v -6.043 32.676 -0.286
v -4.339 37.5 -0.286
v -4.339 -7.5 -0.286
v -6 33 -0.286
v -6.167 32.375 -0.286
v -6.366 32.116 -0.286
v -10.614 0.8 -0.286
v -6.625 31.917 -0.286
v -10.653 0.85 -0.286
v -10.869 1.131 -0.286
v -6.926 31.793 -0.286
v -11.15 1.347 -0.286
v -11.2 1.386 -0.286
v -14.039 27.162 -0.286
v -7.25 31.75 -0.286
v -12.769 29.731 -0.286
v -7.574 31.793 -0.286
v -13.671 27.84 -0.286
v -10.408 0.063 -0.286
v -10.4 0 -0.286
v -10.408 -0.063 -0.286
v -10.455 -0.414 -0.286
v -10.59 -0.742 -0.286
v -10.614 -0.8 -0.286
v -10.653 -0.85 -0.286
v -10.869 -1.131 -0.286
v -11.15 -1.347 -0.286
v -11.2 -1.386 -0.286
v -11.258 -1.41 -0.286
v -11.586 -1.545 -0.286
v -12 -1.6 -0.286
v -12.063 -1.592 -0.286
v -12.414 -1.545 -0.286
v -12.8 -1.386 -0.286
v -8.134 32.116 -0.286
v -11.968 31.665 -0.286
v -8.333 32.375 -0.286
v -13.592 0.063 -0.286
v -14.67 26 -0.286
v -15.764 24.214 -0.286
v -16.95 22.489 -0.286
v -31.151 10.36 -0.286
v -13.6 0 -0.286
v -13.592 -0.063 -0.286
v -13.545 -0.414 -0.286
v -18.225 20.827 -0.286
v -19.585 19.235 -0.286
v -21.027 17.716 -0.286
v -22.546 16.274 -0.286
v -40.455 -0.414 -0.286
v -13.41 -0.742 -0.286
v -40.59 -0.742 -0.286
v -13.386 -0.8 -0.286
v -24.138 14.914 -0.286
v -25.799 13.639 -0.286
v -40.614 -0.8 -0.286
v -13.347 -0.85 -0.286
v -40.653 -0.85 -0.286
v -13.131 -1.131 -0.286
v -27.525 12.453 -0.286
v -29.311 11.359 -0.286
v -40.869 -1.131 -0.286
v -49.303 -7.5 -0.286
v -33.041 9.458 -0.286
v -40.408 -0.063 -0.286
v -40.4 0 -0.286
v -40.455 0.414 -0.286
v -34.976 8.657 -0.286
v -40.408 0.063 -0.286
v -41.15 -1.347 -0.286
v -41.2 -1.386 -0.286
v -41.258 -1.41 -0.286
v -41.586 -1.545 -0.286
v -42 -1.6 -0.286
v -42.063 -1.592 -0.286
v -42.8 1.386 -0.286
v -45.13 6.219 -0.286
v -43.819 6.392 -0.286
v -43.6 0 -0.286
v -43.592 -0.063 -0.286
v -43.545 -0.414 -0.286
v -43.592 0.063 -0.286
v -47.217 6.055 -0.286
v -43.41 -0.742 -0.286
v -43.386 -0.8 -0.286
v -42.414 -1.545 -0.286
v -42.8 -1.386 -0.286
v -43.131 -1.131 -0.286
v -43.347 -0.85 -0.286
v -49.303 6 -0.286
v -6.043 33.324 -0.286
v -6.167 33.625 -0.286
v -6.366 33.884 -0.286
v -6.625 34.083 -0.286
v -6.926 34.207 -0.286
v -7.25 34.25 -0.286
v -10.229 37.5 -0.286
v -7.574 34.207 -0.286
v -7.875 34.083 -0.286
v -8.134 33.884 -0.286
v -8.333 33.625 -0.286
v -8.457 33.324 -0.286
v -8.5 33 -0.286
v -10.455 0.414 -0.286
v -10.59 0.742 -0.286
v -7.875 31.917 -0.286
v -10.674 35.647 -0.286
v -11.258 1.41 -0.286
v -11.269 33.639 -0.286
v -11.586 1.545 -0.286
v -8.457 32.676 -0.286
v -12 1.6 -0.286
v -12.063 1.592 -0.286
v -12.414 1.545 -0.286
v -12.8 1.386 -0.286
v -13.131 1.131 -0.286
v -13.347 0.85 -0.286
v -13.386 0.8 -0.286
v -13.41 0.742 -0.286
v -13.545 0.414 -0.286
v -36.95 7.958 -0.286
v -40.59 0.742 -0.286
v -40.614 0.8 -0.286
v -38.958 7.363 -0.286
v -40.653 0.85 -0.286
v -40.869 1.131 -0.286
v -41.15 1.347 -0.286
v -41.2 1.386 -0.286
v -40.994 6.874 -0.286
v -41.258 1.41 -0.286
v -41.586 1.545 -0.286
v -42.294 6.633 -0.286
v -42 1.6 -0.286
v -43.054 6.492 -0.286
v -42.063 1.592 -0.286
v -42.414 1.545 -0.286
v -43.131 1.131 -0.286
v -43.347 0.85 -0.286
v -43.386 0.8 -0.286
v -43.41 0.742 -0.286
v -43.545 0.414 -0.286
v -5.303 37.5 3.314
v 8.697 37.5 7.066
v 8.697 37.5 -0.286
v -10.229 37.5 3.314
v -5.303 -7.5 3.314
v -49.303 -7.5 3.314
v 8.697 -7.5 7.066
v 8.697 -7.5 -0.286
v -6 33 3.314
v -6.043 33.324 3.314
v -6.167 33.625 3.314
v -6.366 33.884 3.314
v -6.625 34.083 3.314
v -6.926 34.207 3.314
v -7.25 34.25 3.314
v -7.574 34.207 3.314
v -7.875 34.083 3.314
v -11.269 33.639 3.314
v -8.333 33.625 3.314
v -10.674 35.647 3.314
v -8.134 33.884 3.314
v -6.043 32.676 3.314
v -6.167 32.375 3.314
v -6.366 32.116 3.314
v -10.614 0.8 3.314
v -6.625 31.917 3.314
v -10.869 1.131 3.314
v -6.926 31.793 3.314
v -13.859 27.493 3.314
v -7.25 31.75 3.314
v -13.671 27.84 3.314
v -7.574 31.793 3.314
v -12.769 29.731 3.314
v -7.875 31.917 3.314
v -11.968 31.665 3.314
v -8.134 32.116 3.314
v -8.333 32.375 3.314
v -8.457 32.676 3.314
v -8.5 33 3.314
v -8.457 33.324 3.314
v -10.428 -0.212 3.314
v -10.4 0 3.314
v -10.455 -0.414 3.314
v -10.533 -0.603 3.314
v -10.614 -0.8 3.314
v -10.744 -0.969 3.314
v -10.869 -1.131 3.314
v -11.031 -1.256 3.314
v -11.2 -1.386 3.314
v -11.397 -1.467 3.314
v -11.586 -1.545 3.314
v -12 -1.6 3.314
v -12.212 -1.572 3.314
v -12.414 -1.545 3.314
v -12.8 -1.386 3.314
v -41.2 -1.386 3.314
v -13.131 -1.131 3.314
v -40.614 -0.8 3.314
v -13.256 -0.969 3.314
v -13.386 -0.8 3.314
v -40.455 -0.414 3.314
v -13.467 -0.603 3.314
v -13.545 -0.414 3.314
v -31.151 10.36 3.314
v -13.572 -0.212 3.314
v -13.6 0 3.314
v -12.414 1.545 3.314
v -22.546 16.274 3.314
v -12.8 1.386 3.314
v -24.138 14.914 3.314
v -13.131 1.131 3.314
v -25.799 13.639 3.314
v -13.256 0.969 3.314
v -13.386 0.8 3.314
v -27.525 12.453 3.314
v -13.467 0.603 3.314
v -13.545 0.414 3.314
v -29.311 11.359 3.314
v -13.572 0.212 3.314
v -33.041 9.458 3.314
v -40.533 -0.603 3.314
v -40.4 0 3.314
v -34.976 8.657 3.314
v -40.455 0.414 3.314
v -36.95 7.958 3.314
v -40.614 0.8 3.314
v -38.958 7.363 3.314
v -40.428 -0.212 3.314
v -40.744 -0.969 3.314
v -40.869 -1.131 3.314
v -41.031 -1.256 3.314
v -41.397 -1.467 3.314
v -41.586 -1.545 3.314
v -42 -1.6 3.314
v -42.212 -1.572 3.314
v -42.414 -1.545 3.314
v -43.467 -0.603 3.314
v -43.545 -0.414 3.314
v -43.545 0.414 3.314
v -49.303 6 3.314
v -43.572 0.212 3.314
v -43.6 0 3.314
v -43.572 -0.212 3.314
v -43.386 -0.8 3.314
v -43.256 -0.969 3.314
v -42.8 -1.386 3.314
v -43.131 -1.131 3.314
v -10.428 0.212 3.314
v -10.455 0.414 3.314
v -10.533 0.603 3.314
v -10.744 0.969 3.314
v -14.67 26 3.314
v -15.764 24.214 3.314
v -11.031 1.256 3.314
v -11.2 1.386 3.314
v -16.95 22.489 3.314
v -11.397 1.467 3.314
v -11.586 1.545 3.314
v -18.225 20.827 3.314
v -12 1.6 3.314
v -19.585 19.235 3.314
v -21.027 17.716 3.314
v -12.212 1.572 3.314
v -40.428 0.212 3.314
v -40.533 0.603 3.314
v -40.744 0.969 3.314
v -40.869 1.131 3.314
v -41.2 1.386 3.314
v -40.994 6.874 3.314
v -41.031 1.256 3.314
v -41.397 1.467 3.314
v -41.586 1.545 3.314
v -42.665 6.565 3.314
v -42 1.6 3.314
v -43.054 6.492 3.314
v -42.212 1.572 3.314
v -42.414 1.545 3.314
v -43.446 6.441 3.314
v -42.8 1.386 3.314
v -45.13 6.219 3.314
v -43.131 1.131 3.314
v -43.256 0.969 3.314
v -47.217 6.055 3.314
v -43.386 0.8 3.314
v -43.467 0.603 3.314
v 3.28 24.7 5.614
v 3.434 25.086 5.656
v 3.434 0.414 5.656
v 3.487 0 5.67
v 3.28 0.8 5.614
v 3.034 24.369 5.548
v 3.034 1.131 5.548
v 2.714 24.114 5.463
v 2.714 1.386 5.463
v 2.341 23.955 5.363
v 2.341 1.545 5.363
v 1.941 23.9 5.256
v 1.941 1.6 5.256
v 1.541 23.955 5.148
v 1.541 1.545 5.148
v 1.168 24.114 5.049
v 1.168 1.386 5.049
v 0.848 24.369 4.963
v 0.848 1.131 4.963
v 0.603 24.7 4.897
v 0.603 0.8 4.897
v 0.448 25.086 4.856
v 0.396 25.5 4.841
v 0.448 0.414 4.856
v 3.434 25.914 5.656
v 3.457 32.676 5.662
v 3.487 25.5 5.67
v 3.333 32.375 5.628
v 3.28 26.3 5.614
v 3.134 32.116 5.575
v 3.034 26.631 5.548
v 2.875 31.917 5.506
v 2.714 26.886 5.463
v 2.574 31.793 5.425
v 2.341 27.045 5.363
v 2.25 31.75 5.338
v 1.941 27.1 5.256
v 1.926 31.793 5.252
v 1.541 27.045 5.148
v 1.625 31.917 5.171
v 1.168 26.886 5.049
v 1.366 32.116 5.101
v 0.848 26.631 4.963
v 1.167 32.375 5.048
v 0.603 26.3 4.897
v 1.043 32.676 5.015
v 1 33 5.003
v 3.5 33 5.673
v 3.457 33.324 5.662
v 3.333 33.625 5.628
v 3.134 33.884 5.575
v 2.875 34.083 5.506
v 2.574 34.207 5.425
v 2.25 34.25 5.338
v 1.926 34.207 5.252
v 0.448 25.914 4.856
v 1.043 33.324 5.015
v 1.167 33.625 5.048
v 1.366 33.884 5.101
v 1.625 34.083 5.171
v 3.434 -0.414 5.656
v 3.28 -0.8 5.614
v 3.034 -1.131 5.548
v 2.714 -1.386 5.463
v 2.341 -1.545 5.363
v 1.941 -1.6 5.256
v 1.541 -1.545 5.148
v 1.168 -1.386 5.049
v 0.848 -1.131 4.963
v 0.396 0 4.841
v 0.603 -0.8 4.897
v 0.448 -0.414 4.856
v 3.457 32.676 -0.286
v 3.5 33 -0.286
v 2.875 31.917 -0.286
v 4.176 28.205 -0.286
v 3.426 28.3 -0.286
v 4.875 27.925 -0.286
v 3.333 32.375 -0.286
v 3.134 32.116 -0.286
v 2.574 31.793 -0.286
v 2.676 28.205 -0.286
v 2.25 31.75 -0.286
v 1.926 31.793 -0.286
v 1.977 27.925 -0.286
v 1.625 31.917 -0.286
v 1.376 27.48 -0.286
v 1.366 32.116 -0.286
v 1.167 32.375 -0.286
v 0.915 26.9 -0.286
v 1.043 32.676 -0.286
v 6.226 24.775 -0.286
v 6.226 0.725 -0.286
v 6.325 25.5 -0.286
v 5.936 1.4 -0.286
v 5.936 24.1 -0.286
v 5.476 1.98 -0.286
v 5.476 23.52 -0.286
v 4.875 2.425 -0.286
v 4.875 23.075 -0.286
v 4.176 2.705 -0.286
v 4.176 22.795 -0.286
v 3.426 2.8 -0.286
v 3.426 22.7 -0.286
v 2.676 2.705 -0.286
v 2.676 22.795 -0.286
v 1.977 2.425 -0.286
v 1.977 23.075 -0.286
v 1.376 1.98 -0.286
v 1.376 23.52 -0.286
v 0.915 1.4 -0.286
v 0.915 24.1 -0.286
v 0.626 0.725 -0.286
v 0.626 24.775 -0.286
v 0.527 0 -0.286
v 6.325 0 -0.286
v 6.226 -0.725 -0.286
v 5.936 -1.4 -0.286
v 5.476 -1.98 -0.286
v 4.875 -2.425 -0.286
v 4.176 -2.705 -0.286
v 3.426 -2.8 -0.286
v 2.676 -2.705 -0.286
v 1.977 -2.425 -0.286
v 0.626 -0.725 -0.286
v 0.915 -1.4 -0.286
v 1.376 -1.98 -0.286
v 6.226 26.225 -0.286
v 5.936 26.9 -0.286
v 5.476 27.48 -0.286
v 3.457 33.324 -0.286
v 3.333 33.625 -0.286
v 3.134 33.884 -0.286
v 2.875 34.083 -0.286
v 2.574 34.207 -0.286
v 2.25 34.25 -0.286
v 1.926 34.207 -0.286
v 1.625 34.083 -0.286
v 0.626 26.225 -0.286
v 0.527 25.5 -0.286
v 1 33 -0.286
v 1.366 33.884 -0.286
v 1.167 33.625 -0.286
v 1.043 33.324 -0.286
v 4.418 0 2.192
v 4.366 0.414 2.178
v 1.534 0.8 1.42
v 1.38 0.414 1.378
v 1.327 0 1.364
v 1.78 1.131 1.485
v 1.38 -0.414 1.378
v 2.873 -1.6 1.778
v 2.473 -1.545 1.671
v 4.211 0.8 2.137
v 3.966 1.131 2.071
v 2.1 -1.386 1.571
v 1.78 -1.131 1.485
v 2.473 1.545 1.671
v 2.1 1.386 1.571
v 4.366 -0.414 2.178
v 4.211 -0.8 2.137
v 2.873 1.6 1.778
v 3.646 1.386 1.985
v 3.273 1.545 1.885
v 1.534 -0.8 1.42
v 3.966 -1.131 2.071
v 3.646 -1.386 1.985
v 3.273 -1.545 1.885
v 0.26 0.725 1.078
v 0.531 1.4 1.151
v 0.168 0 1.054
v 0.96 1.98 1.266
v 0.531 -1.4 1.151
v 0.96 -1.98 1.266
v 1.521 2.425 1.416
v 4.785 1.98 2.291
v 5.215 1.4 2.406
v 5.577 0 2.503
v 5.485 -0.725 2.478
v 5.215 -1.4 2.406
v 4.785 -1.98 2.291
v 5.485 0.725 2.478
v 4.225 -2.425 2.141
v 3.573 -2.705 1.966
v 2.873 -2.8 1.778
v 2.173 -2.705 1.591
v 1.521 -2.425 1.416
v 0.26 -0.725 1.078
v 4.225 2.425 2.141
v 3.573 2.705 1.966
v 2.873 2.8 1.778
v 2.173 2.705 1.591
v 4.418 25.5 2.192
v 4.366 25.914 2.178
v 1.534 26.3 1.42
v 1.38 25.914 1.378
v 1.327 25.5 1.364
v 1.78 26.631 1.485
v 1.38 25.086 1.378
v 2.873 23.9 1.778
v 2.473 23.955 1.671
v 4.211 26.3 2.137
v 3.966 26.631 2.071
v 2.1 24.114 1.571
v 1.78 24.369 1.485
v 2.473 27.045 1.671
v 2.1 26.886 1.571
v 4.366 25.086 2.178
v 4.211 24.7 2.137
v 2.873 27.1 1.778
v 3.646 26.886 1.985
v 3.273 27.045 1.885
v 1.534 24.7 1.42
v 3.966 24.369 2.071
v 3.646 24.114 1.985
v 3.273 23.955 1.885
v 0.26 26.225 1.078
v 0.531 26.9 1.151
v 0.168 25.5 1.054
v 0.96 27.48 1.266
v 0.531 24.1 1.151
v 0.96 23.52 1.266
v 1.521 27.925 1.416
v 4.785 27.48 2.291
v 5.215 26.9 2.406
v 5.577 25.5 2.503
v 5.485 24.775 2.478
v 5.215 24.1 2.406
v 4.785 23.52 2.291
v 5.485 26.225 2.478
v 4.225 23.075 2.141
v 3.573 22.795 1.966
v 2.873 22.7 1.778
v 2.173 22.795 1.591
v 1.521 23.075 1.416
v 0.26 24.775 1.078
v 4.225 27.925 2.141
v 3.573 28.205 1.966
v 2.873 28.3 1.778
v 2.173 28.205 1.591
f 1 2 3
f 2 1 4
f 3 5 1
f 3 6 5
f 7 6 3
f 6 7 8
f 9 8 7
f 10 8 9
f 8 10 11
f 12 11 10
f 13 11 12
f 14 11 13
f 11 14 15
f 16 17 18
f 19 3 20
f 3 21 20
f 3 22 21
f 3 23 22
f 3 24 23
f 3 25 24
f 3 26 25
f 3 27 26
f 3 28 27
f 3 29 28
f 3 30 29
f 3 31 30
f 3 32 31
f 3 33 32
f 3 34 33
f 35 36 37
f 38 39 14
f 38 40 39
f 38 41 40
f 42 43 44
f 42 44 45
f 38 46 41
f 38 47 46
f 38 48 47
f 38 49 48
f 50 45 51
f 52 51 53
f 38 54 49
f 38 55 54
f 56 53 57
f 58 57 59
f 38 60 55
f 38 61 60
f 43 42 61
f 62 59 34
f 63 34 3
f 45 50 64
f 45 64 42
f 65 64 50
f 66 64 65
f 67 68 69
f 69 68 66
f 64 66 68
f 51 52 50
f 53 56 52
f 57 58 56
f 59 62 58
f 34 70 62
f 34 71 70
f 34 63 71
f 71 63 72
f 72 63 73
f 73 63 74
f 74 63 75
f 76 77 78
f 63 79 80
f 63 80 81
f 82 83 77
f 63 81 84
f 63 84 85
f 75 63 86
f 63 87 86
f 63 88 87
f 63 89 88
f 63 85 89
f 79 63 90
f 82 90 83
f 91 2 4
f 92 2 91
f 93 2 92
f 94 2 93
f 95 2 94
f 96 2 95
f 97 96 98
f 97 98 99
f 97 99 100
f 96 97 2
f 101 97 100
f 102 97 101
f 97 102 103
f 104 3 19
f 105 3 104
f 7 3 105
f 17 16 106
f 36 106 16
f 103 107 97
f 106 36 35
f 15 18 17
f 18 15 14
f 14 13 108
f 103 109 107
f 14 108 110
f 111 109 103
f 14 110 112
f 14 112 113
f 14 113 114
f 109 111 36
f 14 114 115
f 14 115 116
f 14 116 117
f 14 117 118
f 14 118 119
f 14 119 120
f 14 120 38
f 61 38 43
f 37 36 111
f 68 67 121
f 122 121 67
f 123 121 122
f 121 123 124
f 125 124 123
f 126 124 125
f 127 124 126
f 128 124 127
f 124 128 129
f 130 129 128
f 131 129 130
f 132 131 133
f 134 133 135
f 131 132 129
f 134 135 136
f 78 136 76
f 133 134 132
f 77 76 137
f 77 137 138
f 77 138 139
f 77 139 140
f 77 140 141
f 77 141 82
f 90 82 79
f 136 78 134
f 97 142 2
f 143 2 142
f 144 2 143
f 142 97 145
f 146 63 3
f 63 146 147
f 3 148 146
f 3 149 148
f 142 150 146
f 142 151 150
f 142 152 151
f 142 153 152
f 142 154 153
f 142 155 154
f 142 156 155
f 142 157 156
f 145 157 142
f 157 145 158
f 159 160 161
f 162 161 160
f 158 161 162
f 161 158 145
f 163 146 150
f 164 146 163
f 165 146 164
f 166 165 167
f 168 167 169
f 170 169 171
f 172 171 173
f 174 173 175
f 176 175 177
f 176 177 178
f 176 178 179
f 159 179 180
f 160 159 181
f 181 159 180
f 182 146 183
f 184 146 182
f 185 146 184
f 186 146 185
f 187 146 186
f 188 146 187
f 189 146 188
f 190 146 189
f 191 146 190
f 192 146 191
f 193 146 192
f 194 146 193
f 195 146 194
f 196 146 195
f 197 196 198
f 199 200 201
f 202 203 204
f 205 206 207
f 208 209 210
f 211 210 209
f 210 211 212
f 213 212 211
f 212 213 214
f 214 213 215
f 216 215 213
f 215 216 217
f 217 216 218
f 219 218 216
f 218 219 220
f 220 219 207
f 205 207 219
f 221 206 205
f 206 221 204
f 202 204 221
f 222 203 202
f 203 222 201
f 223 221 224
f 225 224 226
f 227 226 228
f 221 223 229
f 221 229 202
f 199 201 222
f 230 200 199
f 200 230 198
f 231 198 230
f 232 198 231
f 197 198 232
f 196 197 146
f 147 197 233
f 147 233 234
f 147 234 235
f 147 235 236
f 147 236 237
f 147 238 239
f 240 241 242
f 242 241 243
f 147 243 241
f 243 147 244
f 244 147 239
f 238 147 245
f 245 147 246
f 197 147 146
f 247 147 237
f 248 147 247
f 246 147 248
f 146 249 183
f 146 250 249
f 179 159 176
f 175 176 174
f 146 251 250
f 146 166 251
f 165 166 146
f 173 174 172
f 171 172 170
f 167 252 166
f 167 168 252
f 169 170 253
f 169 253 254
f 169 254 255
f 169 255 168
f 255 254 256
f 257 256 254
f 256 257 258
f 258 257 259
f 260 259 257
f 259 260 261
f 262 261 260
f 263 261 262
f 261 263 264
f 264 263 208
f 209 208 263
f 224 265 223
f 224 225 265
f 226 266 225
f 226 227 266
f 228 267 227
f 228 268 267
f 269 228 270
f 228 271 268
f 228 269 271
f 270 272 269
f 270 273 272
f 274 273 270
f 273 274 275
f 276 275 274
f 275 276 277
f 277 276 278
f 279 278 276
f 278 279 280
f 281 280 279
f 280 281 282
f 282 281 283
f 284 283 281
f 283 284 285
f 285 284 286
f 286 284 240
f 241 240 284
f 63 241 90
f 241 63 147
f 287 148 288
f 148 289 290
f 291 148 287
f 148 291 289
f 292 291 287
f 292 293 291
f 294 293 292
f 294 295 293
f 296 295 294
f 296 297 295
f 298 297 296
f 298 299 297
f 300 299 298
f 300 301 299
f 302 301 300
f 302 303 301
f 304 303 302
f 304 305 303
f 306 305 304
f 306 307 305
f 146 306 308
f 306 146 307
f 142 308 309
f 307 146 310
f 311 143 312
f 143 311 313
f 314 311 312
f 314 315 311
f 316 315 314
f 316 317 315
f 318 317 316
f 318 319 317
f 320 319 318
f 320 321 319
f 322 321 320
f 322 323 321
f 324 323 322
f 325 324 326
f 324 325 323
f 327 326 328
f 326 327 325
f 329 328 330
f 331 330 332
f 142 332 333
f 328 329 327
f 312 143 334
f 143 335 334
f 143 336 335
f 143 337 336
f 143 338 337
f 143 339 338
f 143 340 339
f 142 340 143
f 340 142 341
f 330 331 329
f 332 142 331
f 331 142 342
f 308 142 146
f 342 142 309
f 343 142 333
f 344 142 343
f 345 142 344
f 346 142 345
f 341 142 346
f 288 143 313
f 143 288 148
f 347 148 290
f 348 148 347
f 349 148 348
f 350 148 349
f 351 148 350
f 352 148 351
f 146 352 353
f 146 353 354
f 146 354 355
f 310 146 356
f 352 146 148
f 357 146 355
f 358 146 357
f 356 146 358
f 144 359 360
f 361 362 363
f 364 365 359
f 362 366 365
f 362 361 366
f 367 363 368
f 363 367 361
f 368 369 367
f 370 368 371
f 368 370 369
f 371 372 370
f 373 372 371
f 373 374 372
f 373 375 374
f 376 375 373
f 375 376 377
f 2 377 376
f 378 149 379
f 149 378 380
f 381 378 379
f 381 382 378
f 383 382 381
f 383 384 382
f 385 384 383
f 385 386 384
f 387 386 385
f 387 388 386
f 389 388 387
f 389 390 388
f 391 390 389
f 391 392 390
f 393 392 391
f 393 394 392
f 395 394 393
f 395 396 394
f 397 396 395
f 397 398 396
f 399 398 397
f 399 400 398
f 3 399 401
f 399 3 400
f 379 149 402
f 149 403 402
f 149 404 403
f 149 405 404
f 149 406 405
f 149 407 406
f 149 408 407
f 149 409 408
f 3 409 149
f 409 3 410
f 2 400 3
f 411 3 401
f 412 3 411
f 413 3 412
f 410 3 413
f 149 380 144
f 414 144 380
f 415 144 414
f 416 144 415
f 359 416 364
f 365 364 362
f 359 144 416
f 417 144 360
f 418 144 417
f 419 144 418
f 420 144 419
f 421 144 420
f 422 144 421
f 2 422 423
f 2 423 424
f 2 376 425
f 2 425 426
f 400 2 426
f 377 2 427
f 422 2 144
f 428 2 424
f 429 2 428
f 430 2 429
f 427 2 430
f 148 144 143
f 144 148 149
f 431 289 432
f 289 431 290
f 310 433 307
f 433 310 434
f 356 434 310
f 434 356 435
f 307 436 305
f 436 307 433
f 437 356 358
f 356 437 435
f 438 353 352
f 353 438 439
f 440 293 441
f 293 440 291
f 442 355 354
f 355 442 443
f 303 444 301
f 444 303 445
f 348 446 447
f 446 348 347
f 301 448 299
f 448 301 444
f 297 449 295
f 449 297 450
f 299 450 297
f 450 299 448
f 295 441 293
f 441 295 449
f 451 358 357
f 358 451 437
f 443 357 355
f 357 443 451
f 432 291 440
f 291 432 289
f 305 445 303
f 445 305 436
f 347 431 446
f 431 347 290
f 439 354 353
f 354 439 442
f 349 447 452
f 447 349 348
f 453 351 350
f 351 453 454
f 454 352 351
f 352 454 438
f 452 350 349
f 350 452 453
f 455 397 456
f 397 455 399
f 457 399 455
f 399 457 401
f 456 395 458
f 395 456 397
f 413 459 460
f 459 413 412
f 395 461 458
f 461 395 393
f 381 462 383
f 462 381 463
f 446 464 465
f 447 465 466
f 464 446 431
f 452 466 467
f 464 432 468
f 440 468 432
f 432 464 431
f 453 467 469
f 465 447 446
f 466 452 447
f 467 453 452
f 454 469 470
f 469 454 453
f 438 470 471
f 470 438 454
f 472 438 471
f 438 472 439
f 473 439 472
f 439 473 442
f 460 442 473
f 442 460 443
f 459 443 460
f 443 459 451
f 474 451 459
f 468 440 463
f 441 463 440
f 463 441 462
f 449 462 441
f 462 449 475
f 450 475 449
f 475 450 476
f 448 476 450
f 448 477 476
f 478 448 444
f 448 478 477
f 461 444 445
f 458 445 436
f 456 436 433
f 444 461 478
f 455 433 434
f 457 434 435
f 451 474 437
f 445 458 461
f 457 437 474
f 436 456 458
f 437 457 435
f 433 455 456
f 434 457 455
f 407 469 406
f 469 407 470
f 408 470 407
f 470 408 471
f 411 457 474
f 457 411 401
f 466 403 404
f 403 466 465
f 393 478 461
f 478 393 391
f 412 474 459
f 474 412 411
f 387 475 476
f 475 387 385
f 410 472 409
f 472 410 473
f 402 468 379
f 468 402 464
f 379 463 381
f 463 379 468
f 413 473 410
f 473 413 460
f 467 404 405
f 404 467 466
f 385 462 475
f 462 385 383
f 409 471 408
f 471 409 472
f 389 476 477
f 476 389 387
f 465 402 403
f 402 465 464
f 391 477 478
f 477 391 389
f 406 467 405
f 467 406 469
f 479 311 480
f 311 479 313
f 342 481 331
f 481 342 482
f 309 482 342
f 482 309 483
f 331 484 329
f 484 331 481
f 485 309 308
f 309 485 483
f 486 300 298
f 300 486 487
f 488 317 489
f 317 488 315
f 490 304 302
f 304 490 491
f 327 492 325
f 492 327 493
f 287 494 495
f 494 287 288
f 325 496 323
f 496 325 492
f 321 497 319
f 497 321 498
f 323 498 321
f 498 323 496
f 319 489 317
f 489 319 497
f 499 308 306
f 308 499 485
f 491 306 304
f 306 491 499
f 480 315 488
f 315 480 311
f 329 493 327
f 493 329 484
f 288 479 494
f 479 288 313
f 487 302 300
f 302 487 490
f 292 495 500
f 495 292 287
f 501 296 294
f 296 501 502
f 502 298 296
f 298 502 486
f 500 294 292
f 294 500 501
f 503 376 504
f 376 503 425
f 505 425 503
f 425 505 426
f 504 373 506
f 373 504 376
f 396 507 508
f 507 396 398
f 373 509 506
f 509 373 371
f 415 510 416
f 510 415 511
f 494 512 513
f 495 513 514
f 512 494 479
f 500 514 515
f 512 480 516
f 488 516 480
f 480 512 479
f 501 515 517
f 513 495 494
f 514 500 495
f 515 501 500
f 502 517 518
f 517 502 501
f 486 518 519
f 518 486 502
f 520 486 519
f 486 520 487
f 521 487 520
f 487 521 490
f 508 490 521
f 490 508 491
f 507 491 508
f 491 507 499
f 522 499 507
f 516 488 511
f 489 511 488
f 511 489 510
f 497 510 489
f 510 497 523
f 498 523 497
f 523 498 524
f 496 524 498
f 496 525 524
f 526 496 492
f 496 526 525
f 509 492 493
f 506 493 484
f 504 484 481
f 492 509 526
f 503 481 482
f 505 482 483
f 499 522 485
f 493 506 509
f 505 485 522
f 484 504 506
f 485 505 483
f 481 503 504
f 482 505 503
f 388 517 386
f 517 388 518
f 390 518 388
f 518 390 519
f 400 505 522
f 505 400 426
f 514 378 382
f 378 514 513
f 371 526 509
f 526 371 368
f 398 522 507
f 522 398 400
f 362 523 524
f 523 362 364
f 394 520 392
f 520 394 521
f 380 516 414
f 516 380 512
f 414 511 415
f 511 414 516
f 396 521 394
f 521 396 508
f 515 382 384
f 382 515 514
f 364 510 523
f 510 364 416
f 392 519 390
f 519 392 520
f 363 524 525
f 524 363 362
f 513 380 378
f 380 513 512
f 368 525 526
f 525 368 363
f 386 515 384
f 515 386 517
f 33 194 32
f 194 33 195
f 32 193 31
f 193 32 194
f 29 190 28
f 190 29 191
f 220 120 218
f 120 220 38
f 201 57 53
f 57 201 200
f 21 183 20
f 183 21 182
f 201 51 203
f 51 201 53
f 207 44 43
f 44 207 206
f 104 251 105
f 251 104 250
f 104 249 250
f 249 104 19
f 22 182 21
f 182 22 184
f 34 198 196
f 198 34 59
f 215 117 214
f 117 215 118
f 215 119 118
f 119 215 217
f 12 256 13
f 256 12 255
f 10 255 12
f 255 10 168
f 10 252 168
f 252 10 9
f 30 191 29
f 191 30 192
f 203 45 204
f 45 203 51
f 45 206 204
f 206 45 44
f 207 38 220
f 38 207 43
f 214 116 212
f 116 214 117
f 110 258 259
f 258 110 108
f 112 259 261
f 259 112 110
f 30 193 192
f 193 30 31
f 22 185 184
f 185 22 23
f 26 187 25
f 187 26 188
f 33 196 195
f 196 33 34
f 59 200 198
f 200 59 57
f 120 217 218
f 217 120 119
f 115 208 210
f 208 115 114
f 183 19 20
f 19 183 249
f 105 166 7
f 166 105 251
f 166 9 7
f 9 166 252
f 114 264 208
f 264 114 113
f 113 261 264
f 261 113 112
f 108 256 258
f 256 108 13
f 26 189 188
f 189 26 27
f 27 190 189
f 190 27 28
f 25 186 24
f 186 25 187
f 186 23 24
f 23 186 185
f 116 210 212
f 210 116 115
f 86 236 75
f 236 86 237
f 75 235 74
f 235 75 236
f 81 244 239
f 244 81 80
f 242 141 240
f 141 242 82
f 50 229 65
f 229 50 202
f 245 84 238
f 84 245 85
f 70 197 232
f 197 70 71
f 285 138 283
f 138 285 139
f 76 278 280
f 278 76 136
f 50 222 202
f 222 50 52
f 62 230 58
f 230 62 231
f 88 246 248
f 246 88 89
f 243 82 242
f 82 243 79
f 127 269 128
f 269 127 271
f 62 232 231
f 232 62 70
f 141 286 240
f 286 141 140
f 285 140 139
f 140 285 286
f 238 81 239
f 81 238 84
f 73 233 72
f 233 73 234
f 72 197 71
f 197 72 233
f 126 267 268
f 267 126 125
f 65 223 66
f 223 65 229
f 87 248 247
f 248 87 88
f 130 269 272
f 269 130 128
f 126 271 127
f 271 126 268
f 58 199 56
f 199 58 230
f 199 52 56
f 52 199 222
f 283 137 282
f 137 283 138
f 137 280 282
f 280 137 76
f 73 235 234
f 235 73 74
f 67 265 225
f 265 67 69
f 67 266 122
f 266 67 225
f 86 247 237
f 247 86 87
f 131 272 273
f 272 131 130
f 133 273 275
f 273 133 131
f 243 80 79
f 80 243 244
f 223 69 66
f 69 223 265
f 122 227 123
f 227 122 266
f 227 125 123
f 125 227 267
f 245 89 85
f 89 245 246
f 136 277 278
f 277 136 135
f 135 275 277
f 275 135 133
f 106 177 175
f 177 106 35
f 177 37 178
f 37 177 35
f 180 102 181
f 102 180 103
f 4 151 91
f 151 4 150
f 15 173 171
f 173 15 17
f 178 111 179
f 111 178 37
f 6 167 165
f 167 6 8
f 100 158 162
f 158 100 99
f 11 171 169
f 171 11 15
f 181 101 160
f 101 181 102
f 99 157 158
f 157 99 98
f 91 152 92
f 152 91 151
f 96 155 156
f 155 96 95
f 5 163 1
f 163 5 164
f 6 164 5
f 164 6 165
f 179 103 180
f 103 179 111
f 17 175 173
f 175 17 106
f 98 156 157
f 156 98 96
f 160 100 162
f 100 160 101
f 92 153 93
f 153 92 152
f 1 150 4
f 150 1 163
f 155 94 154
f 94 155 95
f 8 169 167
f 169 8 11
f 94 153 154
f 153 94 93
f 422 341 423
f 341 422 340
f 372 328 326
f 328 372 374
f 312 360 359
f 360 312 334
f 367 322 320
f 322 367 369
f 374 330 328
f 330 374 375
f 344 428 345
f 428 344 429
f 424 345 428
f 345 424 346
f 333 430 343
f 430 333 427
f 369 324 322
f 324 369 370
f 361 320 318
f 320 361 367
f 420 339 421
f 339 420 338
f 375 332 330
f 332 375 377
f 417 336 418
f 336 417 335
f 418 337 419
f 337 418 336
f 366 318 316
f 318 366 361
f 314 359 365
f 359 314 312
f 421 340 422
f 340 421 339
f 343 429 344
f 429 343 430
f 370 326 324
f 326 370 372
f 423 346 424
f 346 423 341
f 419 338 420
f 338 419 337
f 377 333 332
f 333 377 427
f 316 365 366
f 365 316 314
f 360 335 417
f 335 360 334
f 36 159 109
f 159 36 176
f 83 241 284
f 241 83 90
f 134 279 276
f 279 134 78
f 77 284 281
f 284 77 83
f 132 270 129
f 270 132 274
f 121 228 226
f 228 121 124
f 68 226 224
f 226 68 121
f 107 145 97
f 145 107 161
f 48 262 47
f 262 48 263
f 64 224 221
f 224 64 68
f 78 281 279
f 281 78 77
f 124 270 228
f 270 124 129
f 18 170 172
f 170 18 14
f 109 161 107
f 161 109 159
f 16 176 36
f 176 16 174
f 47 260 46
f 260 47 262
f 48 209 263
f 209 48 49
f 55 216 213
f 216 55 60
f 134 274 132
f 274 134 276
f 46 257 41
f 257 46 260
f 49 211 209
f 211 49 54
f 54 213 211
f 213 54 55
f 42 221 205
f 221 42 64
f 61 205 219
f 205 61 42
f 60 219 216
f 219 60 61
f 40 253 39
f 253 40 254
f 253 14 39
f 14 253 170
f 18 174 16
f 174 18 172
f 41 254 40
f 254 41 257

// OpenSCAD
// file: configuration.scad
// Increase this if your slicer or printer make holes too tight.
extra_radius = 0.2;

// OD = outside diameter, corner to corner.
m3_nut_od = 6.1;
m3_nut_radius = m3_nut_od/2 + 0.2 + extra_radius;

// Major diameter of metric 3mm thread.
m3_major = 2.85;
m3_radius = m3_major/2 + extra_radius;
m3_wide_radius = m3_major/2 + 0.2 + extra_radius;

// NEMA17 stepper motors.
motor_shaft_diameter = 5;
motor_shaft_radius = motor_shaft_diameter/2 + extra_radius;

// Frame brackets.
thickness = 3.6;
// main file
include <configuration.scad>;

height = 45;
diagonal = 15*sqrt(2);

module frame_endstop() {
  difference() {
    intersection() {
      translate([diagonal/2, 0, 0]) rotate([0, 0, -30])
	translate([thickness-11, 15, height/2-7.5])
	cube([22, 58, height], center=true);
      union() {
	translate([diagonal/2, 0, 0]) rotate([0, 0, -30])
	  translate([thickness/2, 20, height/2-7.5])
	  cube([thickness, 48, height], center=true);
	rotate([0, 0, -45])
	  translate([15, 0, height/2-7.5])
	  cube([15, 15, height], center=true);
      }
    }
    // Vertical OpenBeam mounting screw holes.
    for (z = [0, 0.85]) {
      translate([0, 0, z*(height-15)]) rotate([90, 0, 45])
	translate([0, 0, 7.5+thickness]) {
	cylinder(r=1.6, h=12, $fn=24, center=true);
	cylinder(r=2.8, h=8, $fn=24);
      }
    }
    // Horizontal OpenBeam mounting screw holes.
    for (y = [12, 42]) {
      rotate([0, 0, -30])
	translate([7.5+thickness/2, y, 0])
	rotate([0, 90, 0])
	cylinder(r=1.6, h=10, $fn=24, center=true);
    }
    translate([38, 35, 46]) rotate([0, 90, -30]) #
      cylinder(r=40, h=20, center=true, $fn=120);
    // HoneyWell ZM micro switch.
    rotate([0, 0, -30]) translate([16, 2.5, height-12]) {
      translate([0, 0, 2]) # cube([6.3, 19.8, 10.6], center=true);
      translate([0, 9.5/2, 0]) rotate([0, 90, 0]) #
	cylinder(r=1.25, h=30, center=true, $fn=24);
      translate([0, -9.5/2, 0]) rotate([0, 90, 0]) #
	cylinder(r=1.25, h=30, center=true, $fn=24);
    }
  }
}

translate([0, 0, 12.5])
rotate([0, 90, 90])
rotate([0, 0, 30]) {
  frame_endstop();
  // OpenBeam.
  % rotate([0, 0, 45]) cube([15, 15, 100], center=true);
}
